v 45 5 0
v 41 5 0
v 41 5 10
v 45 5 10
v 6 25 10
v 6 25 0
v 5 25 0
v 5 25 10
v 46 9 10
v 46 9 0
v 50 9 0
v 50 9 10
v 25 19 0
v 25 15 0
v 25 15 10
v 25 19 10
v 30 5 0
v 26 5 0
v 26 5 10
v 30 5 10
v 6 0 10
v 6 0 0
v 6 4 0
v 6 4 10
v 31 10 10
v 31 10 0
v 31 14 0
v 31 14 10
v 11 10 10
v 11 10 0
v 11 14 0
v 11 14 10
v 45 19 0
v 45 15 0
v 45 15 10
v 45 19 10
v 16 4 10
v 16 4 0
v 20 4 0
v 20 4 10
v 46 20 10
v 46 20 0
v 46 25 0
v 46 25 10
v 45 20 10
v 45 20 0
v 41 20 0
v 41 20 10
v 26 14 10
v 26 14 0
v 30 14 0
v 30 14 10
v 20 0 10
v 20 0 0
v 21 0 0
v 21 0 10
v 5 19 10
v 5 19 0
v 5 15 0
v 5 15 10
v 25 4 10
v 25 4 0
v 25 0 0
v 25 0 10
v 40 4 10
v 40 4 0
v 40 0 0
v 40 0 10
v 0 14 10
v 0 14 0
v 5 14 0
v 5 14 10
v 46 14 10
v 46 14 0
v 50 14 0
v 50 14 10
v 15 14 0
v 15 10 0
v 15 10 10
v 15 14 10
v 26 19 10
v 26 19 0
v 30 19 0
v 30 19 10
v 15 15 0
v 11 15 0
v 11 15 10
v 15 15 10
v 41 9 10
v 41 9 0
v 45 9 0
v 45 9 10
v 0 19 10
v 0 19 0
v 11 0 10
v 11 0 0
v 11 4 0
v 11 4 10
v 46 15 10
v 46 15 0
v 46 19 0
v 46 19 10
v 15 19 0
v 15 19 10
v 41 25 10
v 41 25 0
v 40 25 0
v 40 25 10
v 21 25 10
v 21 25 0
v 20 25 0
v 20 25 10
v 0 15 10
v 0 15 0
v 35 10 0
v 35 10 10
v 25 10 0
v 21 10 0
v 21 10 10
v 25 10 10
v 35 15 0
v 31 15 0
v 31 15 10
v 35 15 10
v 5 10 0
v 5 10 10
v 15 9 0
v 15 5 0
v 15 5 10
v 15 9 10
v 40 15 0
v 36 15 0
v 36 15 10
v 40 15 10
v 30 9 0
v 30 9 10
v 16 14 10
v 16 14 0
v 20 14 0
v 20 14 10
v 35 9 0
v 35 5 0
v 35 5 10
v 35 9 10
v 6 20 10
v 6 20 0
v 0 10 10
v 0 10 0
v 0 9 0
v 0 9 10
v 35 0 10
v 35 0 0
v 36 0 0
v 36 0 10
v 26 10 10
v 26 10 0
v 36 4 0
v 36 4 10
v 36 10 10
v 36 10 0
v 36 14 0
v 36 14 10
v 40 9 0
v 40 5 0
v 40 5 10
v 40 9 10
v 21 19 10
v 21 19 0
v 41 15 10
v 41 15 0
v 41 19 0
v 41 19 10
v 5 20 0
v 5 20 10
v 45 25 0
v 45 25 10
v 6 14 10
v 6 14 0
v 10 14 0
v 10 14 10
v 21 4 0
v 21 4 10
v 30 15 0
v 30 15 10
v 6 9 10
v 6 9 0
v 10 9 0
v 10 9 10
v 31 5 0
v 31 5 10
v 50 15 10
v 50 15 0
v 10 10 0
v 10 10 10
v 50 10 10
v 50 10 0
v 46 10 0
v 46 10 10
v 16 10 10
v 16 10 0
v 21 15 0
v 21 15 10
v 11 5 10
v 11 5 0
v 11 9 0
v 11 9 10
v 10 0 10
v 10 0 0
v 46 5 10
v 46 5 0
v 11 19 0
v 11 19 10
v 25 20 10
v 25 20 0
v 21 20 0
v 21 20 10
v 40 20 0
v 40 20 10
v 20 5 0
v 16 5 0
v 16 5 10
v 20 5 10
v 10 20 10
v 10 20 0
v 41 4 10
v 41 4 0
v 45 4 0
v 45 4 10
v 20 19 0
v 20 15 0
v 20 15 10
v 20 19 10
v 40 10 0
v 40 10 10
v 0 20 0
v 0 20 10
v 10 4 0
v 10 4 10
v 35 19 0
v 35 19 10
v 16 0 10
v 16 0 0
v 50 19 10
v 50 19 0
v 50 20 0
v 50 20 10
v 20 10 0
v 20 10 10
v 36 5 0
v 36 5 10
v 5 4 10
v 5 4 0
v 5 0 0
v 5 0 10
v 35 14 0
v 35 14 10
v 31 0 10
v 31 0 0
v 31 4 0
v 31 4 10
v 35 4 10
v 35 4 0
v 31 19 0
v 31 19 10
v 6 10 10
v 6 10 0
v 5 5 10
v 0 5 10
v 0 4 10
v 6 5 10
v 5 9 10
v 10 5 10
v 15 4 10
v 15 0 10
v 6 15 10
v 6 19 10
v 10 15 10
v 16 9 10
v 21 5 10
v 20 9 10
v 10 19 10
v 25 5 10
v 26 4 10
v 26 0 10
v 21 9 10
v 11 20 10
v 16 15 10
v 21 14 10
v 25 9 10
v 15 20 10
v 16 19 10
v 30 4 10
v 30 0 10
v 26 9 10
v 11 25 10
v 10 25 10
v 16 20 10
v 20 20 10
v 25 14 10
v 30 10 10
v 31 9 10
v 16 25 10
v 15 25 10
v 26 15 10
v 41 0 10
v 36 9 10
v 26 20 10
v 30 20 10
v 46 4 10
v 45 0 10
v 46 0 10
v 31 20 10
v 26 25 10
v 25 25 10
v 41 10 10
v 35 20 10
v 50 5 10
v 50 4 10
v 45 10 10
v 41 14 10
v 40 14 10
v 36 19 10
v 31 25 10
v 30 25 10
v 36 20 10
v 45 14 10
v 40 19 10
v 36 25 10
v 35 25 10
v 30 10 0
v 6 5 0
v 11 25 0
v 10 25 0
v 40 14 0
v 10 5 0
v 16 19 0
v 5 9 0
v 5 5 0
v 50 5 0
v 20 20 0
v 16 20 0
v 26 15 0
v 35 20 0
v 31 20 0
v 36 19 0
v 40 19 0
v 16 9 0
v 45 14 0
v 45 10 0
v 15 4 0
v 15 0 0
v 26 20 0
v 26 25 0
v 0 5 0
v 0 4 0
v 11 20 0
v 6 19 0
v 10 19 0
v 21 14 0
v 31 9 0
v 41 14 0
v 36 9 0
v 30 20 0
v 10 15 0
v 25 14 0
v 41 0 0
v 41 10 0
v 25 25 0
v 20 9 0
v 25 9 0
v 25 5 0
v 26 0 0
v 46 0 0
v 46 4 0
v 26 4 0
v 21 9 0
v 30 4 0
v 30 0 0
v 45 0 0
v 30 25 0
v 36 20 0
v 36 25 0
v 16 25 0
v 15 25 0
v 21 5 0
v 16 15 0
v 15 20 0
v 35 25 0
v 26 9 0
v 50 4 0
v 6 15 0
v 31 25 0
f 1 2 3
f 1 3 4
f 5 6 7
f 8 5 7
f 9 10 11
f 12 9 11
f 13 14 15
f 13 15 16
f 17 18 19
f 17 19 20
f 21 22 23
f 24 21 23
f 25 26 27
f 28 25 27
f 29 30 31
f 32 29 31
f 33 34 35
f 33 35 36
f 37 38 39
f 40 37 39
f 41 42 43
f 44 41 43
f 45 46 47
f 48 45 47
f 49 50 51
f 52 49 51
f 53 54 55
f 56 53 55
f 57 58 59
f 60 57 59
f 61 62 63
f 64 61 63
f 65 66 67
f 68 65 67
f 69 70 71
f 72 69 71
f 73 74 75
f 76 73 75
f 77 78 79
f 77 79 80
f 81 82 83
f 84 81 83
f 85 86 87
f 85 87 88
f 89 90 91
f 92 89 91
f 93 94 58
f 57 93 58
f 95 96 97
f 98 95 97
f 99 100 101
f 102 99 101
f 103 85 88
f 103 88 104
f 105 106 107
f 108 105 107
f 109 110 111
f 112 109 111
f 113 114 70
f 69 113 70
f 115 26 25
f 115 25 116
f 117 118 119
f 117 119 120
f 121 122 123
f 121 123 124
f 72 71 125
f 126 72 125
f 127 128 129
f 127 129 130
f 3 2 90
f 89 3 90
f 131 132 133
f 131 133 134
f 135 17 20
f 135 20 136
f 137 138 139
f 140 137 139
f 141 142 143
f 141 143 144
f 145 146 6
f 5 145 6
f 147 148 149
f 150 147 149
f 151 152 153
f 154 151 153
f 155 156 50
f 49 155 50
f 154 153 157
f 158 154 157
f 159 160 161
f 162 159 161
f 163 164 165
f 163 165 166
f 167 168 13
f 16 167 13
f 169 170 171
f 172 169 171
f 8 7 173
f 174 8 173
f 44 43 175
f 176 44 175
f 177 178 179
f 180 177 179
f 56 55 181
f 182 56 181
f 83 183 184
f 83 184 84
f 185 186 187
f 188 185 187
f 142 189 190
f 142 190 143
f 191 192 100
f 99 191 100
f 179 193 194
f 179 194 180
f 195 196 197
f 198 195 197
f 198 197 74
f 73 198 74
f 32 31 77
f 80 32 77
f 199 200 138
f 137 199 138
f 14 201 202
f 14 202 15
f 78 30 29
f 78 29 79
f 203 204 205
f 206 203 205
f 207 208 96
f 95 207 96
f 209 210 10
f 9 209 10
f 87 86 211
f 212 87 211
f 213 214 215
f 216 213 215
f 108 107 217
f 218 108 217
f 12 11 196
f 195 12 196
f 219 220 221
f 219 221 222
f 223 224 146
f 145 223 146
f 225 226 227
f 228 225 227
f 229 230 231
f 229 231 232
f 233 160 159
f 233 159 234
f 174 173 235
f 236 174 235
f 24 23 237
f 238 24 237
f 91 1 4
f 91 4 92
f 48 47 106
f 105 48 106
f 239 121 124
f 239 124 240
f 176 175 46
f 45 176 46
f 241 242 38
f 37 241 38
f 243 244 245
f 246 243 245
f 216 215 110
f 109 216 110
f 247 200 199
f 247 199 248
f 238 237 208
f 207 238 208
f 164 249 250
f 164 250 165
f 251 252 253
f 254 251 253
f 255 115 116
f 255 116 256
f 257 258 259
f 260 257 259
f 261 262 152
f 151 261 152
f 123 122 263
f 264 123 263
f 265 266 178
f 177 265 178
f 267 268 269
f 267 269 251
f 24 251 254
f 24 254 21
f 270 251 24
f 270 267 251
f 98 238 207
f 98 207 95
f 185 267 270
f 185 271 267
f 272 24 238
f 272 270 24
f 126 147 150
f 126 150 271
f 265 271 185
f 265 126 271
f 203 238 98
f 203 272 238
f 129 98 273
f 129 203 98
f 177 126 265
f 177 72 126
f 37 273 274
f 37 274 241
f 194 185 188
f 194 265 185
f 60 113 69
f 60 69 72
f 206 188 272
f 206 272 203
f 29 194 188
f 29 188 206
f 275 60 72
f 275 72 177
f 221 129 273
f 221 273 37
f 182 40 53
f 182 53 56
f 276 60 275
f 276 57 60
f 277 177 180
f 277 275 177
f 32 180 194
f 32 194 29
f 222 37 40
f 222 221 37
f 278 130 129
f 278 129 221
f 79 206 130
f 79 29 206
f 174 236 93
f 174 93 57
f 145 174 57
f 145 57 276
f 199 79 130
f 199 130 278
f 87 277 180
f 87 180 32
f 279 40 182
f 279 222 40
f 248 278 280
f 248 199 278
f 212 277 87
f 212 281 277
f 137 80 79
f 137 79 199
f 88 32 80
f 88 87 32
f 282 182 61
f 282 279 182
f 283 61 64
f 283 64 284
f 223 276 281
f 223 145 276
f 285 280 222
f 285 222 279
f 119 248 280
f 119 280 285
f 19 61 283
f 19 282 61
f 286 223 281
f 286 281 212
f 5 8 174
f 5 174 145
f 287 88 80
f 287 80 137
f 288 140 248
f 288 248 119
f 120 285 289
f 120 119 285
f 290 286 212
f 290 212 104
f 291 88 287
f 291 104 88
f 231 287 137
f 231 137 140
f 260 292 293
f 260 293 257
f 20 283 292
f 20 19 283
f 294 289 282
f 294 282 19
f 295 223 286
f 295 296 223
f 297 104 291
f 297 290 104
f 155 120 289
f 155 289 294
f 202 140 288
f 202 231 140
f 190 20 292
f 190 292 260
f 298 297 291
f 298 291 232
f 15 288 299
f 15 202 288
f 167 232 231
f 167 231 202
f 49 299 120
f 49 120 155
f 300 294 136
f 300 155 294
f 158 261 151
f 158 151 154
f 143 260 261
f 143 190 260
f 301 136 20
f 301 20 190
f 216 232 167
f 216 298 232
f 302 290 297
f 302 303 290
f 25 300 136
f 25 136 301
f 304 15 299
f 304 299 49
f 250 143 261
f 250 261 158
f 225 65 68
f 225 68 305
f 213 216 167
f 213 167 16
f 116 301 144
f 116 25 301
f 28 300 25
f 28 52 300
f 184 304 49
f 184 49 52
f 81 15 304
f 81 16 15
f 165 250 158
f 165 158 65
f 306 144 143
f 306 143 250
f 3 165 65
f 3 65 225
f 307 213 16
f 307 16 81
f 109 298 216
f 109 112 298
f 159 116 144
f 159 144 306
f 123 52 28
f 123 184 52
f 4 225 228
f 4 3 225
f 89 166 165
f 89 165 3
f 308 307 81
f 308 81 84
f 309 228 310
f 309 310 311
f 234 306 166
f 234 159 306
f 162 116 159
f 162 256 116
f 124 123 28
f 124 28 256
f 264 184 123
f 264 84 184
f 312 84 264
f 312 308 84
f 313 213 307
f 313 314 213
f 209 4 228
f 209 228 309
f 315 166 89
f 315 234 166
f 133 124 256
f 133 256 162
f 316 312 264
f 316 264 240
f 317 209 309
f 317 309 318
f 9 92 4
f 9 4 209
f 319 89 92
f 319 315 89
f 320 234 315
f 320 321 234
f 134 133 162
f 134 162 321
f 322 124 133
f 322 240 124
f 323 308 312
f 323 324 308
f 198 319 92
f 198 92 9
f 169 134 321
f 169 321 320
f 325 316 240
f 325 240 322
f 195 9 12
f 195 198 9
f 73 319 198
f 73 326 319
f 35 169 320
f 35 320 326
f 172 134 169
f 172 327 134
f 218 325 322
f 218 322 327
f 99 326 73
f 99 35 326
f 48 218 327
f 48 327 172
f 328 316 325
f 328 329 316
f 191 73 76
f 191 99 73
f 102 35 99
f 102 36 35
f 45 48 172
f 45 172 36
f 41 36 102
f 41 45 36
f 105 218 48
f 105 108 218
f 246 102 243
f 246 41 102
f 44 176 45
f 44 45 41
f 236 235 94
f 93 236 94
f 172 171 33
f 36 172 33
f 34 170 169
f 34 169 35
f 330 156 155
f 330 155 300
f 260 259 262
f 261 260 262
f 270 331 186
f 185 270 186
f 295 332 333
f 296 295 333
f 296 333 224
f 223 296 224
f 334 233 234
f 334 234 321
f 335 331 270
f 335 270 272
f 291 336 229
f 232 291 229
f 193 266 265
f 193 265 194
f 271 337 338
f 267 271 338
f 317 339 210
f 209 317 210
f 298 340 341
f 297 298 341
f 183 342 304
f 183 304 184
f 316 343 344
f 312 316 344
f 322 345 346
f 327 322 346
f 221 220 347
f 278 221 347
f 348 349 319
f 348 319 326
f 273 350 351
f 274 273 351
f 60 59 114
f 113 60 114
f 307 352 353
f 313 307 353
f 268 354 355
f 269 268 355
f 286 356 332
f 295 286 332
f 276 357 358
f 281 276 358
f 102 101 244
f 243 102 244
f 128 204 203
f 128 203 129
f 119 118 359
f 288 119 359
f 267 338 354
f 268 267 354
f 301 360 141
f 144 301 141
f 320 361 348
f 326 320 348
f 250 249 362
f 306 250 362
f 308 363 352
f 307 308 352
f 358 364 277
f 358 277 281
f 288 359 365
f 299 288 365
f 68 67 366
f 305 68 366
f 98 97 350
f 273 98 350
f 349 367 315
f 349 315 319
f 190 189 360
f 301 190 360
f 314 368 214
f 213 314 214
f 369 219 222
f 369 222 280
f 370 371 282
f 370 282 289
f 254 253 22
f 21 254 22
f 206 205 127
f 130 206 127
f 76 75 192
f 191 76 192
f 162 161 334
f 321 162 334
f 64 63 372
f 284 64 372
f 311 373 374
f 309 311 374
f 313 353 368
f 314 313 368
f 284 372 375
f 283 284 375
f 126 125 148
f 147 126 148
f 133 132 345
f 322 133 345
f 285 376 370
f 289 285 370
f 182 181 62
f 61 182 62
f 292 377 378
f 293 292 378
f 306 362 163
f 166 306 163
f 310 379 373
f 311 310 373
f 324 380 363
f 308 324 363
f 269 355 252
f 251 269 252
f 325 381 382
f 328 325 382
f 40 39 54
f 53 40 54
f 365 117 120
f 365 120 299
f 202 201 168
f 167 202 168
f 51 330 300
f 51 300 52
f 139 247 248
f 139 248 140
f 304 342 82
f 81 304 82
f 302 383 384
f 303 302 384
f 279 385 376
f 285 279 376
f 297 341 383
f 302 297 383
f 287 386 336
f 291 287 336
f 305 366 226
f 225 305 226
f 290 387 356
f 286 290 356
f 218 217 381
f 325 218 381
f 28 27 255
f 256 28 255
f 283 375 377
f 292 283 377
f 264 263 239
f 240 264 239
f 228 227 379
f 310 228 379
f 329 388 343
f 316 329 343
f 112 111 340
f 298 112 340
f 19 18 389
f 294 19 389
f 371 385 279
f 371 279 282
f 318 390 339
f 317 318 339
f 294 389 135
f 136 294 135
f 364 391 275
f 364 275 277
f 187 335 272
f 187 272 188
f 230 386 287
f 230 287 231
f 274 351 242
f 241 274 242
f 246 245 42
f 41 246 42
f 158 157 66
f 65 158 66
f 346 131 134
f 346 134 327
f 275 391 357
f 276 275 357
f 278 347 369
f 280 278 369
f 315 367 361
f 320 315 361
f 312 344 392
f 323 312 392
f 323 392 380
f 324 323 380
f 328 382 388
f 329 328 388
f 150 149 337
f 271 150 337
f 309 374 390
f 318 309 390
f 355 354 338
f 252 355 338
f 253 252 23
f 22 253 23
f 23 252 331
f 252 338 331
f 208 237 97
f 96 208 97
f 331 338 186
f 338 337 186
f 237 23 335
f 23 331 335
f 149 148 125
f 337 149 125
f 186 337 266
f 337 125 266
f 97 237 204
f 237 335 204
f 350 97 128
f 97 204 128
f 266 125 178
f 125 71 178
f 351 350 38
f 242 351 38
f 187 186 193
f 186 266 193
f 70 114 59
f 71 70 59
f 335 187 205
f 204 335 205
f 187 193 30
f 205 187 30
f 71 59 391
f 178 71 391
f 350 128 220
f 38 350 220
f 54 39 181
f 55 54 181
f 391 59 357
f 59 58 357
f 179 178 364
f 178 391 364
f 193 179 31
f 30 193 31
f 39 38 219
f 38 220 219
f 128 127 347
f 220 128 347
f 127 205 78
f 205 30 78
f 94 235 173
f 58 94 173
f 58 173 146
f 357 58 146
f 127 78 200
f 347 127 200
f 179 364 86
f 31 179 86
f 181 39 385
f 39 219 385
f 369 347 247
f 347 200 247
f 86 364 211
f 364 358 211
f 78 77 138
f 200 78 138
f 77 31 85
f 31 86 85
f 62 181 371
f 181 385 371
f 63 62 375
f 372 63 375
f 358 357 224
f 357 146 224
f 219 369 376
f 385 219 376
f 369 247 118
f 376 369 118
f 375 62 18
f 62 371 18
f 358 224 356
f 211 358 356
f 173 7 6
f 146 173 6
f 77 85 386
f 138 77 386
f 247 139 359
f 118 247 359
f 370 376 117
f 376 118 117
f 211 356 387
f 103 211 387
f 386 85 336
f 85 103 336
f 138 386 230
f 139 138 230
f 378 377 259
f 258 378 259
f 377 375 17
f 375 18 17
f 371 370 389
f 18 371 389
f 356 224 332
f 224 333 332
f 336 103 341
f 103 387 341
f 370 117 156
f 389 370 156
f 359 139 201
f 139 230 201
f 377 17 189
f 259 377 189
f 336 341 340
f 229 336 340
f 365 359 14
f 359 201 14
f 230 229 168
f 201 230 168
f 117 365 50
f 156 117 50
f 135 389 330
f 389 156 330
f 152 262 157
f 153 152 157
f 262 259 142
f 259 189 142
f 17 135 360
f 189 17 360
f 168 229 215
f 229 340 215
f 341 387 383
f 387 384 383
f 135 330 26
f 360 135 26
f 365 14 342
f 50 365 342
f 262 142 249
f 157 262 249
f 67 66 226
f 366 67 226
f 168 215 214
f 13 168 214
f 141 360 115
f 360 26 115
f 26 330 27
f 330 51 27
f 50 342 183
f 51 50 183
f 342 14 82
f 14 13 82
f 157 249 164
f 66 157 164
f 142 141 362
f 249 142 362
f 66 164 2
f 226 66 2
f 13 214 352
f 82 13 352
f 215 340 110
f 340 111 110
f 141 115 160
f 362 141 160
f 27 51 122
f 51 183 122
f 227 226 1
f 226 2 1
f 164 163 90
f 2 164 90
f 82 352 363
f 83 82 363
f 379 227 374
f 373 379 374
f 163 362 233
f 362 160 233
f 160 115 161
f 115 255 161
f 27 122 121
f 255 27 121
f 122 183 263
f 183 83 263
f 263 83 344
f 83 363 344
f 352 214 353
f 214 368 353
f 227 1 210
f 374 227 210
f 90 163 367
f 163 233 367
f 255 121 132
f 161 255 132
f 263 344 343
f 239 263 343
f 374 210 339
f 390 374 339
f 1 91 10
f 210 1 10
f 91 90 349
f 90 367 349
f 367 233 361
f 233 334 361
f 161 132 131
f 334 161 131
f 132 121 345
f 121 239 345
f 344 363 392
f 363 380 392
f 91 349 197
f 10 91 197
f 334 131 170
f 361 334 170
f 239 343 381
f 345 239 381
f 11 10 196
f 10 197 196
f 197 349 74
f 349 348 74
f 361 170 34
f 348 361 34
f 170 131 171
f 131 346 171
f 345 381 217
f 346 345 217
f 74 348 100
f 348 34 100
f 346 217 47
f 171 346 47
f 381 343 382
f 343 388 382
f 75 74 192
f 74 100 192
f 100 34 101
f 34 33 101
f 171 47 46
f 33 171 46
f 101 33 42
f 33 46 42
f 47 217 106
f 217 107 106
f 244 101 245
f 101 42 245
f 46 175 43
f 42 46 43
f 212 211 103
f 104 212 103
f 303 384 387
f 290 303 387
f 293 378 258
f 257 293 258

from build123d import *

# Parameters (mm, degrees)
F0_W     = 4
F0_H     = 4
F1_DEPTH = 10


with BuildPart() as f1:
    # F0 (on Top) → F1 (new body)
    with BuildSketch(Plane.XY):
        Polygon((0, 5), (0, 4), (1, 4), (5, 4), (5, 0), (6, 0), (6, 4), (10, 4), (10, 0), (11, 0), (11, 4), (15, 4), (15, 0), (16, 0), (16, 4), (20, 4), (20, 0), (21, 0), (21, 4), (25, 4), (25, 0), (26, 0), (26, 4), (30, 4), (30, 0), (31, 0), (31, 4), (35, 4), (35, 0), (36, 0), (36, 4), (40, 4), (40, 0), (41, 0), (41, 4), (45, 4), (45, 0), (46, 0), (46, 4), (50, 4), (50, 5), (46, 5), (46, 9), (50, 9), (50, 10), (46, 10), (46, 14), (50, 14), (50, 15), (46, 15), (46, 19), (50, 19), (50, 20), (46, 20), (46, 24), (46, 25), (45, 25), (45, 24), (45, 20), (41, 20), (41, 24), (41, 25), (40, 25), (40, 24), (40, 20), (36, 20), (36, 24), (36, 25), (35, 25), (35, 24), (35, 20), (31, 20), (31, 24), (31, 25), (30, 25), (30, 24), (30, 20), (26, 20), (26, 24), (26, 25), (25, 25), (25, 24), (25, 20), (21, 20), (21, 24), (21, 25), (20, 25), (20, 24), (20, 20), (16, 20), (16, 24), (16, 25), (15, 25), (15, 24), (15, 20), (11, 20), (11, 24), (11, 25), (10, 25), (10, 24), (10, 20), (6, 20), (6, 24), (6, 25), (5, 25), (5, 24), (5, 20), (1, 20), (0, 20), (0, 19), (1, 19), (5, 19), (5, 15), (1, 15), (0, 15), (0, 14), (1, 14), (5, 14), (5, 10), (1, 10), (0, 10), (0, 9), (1, 9), (5, 9), (5, 5), (1, 5), align=None)
        with Locations((8, 7)):
            Rectangle(F0_W, F0_H, mode=Mode.SUBTRACT)
        with Locations((8, 12)):
            Rectangle(F0_W, F0_H, mode=Mode.SUBTRACT)
        with Locations((13, 7)):
            Rectangle(F0_W, F0_H, mode=Mode.SUBTRACT)
        with Locations((18, 7)):
            Rectangle(F0_W, F0_H, mode=Mode.SUBTRACT)
        with Locations((23, 7)):
            Rectangle(F0_W, F0_H, mode=Mode.SUBTRACT)
        with Locations((13, 12)):
            Rectangle(F0_W, F0_H, mode=Mode.SUBTRACT)
        with Locations((18, 12)):
            Rectangle(F0_W, F0_H, mode=Mode.SUBTRACT)
        with Locations((23, 12)):
            Rectangle(F0_W, F0_H, mode=Mode.SUBTRACT)
        with Locations((28, 7)):
            Rectangle(F0_W, F0_H, mode=Mode.SUBTRACT)
        with Locations((33, 7)):
            Rectangle(F0_W, F0_H, mode=Mode.SUBTRACT)
        with Locations((28, 12)):
            Rectangle(F0_W, F0_H, mode=Mode.SUBTRACT)
        with Locations((33, 12)):
            Rectangle(F0_W, F0_H, mode=Mode.SUBTRACT)
        with Locations((38, 7)):
            Rectangle(F0_W, F0_H, mode=Mode.SUBTRACT)
        with Locations((43, 7)):
            Rectangle(F0_W, F0_H, mode=Mode.SUBTRACT)
        with Locations((38, 12)):
            Rectangle(F0_W, F0_H, mode=Mode.SUBTRACT)
        with Locations((43, 12)):
            Rectangle(F0_W, F0_H, mode=Mode.SUBTRACT)
        with Locations((8, 17)):
            Rectangle(F0_W, F0_H, mode=Mode.SUBTRACT)
        with Locations((13, 17)):
            Rectangle(F0_W, F0_H, mode=Mode.SUBTRACT)
        with Locations((18, 17)):
            Rectangle(F0_W, F0_H, mode=Mode.SUBTRACT)
        with Locations((23, 17)):
            Rectangle(F0_W, F0_H, mode=Mode.SUBTRACT)
        with Locations((28, 17)):
            Rectangle(F0_W, F0_H, mode=Mode.SUBTRACT)
        with Locations((33, 17)):
            Rectangle(F0_W, F0_H, mode=Mode.SUBTRACT)
        with Locations((38, 17)):
            Rectangle(F0_W, F0_H, mode=Mode.SUBTRACT)
        with Locations((43, 17)):
            Rectangle(F0_W, F0_H, mode=Mode.SUBTRACT)
    extrude(amount=F1_DEPTH)


solid = f1.part
